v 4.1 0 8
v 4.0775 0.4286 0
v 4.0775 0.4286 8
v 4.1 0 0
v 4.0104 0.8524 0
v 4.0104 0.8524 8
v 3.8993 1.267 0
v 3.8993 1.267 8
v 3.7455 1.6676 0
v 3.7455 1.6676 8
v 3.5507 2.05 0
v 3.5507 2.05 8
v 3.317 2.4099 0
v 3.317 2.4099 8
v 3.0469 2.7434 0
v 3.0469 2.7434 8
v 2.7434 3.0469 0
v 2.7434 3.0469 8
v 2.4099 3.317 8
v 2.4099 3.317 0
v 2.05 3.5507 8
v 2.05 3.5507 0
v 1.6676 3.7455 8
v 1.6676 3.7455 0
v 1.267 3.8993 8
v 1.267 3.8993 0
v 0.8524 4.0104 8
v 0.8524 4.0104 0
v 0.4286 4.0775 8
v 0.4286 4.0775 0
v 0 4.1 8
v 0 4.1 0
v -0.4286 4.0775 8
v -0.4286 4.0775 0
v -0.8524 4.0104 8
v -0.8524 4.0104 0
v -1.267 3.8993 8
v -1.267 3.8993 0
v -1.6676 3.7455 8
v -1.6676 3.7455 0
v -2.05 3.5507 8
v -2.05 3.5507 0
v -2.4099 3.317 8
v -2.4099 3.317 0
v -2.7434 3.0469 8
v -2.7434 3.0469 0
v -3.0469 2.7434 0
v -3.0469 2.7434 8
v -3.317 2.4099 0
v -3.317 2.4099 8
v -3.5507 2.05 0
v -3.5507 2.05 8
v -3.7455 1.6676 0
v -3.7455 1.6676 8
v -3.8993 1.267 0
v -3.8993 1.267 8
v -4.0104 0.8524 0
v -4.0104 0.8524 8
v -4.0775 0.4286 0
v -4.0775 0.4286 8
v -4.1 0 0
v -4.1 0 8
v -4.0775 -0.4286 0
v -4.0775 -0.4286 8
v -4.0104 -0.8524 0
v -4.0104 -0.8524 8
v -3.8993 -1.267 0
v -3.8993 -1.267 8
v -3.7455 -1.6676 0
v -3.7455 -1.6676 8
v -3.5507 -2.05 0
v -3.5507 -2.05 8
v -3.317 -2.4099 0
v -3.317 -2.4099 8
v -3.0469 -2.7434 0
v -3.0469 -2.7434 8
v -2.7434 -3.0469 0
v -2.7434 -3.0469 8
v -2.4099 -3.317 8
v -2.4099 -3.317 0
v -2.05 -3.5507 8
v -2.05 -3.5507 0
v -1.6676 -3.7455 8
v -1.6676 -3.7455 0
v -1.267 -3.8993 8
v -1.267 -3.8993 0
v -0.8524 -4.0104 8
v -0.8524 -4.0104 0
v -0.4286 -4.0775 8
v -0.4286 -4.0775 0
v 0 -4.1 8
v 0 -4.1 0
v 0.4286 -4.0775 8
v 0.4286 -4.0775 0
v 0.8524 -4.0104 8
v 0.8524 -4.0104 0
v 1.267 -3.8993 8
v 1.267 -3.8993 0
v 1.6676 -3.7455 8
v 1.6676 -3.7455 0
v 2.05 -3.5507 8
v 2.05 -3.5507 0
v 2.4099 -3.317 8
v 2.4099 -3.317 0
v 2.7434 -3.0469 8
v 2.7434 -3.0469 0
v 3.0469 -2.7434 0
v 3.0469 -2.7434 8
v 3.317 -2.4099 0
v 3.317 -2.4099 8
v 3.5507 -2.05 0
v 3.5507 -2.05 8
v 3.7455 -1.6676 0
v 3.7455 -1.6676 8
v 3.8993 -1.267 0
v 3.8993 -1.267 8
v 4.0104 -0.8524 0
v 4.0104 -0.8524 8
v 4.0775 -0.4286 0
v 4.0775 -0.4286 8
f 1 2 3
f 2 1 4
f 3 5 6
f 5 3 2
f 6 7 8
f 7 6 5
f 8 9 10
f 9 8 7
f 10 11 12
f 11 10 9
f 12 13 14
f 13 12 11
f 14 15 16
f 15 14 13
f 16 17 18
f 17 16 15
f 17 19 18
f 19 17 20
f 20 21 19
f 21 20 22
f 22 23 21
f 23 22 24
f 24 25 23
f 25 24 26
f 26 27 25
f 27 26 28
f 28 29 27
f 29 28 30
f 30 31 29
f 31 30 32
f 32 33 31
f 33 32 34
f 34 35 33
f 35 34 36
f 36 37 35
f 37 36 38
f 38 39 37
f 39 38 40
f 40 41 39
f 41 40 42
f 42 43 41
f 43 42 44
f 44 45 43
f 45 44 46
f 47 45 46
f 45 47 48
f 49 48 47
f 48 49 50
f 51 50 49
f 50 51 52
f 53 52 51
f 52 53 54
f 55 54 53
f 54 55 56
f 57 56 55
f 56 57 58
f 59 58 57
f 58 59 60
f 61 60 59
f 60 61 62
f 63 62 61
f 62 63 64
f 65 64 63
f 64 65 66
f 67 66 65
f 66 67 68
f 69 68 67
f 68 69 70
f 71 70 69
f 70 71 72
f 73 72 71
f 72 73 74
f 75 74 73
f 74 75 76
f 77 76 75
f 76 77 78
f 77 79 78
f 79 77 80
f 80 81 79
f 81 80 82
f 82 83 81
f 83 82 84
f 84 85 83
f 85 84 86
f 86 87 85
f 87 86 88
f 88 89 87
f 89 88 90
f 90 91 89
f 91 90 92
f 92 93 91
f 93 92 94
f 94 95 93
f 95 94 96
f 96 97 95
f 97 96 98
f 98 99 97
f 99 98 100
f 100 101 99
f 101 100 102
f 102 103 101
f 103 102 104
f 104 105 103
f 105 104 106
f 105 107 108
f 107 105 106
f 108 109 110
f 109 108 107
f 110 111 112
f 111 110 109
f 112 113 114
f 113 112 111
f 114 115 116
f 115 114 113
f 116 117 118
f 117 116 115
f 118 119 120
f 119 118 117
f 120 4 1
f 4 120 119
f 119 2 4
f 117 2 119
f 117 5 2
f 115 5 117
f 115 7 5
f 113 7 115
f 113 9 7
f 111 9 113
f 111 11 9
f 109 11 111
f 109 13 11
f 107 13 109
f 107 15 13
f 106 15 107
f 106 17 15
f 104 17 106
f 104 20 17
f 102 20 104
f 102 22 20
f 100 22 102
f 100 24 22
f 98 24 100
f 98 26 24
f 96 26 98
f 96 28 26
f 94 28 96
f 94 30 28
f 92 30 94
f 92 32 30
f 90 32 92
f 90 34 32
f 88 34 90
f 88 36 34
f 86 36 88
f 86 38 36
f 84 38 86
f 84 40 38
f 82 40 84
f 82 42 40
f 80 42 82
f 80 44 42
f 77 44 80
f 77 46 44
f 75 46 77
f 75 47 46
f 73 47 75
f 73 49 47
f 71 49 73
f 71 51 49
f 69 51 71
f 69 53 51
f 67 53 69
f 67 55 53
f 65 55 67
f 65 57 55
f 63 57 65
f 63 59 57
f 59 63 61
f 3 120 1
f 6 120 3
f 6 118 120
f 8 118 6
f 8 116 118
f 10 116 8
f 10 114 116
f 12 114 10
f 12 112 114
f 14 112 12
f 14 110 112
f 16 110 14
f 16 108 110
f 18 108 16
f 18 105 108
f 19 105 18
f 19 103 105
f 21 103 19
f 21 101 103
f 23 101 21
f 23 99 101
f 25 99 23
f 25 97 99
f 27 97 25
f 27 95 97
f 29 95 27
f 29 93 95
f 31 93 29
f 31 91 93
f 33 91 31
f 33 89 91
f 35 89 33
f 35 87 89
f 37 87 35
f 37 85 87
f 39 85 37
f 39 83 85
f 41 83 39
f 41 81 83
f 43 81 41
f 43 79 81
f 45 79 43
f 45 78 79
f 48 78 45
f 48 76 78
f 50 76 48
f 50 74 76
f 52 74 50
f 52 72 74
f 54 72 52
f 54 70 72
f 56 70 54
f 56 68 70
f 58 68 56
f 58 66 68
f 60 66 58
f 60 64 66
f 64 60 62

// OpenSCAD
// this is just a module for the led's hole
// creates a cylinder
// TBD: get a real led model

led_hole(size=8);

module led_hole(size=5) {
    d_led = size+0.2;
    color("green") cylinder(d=d_led,h=8,$fn=60);
    } // of led_hole()
